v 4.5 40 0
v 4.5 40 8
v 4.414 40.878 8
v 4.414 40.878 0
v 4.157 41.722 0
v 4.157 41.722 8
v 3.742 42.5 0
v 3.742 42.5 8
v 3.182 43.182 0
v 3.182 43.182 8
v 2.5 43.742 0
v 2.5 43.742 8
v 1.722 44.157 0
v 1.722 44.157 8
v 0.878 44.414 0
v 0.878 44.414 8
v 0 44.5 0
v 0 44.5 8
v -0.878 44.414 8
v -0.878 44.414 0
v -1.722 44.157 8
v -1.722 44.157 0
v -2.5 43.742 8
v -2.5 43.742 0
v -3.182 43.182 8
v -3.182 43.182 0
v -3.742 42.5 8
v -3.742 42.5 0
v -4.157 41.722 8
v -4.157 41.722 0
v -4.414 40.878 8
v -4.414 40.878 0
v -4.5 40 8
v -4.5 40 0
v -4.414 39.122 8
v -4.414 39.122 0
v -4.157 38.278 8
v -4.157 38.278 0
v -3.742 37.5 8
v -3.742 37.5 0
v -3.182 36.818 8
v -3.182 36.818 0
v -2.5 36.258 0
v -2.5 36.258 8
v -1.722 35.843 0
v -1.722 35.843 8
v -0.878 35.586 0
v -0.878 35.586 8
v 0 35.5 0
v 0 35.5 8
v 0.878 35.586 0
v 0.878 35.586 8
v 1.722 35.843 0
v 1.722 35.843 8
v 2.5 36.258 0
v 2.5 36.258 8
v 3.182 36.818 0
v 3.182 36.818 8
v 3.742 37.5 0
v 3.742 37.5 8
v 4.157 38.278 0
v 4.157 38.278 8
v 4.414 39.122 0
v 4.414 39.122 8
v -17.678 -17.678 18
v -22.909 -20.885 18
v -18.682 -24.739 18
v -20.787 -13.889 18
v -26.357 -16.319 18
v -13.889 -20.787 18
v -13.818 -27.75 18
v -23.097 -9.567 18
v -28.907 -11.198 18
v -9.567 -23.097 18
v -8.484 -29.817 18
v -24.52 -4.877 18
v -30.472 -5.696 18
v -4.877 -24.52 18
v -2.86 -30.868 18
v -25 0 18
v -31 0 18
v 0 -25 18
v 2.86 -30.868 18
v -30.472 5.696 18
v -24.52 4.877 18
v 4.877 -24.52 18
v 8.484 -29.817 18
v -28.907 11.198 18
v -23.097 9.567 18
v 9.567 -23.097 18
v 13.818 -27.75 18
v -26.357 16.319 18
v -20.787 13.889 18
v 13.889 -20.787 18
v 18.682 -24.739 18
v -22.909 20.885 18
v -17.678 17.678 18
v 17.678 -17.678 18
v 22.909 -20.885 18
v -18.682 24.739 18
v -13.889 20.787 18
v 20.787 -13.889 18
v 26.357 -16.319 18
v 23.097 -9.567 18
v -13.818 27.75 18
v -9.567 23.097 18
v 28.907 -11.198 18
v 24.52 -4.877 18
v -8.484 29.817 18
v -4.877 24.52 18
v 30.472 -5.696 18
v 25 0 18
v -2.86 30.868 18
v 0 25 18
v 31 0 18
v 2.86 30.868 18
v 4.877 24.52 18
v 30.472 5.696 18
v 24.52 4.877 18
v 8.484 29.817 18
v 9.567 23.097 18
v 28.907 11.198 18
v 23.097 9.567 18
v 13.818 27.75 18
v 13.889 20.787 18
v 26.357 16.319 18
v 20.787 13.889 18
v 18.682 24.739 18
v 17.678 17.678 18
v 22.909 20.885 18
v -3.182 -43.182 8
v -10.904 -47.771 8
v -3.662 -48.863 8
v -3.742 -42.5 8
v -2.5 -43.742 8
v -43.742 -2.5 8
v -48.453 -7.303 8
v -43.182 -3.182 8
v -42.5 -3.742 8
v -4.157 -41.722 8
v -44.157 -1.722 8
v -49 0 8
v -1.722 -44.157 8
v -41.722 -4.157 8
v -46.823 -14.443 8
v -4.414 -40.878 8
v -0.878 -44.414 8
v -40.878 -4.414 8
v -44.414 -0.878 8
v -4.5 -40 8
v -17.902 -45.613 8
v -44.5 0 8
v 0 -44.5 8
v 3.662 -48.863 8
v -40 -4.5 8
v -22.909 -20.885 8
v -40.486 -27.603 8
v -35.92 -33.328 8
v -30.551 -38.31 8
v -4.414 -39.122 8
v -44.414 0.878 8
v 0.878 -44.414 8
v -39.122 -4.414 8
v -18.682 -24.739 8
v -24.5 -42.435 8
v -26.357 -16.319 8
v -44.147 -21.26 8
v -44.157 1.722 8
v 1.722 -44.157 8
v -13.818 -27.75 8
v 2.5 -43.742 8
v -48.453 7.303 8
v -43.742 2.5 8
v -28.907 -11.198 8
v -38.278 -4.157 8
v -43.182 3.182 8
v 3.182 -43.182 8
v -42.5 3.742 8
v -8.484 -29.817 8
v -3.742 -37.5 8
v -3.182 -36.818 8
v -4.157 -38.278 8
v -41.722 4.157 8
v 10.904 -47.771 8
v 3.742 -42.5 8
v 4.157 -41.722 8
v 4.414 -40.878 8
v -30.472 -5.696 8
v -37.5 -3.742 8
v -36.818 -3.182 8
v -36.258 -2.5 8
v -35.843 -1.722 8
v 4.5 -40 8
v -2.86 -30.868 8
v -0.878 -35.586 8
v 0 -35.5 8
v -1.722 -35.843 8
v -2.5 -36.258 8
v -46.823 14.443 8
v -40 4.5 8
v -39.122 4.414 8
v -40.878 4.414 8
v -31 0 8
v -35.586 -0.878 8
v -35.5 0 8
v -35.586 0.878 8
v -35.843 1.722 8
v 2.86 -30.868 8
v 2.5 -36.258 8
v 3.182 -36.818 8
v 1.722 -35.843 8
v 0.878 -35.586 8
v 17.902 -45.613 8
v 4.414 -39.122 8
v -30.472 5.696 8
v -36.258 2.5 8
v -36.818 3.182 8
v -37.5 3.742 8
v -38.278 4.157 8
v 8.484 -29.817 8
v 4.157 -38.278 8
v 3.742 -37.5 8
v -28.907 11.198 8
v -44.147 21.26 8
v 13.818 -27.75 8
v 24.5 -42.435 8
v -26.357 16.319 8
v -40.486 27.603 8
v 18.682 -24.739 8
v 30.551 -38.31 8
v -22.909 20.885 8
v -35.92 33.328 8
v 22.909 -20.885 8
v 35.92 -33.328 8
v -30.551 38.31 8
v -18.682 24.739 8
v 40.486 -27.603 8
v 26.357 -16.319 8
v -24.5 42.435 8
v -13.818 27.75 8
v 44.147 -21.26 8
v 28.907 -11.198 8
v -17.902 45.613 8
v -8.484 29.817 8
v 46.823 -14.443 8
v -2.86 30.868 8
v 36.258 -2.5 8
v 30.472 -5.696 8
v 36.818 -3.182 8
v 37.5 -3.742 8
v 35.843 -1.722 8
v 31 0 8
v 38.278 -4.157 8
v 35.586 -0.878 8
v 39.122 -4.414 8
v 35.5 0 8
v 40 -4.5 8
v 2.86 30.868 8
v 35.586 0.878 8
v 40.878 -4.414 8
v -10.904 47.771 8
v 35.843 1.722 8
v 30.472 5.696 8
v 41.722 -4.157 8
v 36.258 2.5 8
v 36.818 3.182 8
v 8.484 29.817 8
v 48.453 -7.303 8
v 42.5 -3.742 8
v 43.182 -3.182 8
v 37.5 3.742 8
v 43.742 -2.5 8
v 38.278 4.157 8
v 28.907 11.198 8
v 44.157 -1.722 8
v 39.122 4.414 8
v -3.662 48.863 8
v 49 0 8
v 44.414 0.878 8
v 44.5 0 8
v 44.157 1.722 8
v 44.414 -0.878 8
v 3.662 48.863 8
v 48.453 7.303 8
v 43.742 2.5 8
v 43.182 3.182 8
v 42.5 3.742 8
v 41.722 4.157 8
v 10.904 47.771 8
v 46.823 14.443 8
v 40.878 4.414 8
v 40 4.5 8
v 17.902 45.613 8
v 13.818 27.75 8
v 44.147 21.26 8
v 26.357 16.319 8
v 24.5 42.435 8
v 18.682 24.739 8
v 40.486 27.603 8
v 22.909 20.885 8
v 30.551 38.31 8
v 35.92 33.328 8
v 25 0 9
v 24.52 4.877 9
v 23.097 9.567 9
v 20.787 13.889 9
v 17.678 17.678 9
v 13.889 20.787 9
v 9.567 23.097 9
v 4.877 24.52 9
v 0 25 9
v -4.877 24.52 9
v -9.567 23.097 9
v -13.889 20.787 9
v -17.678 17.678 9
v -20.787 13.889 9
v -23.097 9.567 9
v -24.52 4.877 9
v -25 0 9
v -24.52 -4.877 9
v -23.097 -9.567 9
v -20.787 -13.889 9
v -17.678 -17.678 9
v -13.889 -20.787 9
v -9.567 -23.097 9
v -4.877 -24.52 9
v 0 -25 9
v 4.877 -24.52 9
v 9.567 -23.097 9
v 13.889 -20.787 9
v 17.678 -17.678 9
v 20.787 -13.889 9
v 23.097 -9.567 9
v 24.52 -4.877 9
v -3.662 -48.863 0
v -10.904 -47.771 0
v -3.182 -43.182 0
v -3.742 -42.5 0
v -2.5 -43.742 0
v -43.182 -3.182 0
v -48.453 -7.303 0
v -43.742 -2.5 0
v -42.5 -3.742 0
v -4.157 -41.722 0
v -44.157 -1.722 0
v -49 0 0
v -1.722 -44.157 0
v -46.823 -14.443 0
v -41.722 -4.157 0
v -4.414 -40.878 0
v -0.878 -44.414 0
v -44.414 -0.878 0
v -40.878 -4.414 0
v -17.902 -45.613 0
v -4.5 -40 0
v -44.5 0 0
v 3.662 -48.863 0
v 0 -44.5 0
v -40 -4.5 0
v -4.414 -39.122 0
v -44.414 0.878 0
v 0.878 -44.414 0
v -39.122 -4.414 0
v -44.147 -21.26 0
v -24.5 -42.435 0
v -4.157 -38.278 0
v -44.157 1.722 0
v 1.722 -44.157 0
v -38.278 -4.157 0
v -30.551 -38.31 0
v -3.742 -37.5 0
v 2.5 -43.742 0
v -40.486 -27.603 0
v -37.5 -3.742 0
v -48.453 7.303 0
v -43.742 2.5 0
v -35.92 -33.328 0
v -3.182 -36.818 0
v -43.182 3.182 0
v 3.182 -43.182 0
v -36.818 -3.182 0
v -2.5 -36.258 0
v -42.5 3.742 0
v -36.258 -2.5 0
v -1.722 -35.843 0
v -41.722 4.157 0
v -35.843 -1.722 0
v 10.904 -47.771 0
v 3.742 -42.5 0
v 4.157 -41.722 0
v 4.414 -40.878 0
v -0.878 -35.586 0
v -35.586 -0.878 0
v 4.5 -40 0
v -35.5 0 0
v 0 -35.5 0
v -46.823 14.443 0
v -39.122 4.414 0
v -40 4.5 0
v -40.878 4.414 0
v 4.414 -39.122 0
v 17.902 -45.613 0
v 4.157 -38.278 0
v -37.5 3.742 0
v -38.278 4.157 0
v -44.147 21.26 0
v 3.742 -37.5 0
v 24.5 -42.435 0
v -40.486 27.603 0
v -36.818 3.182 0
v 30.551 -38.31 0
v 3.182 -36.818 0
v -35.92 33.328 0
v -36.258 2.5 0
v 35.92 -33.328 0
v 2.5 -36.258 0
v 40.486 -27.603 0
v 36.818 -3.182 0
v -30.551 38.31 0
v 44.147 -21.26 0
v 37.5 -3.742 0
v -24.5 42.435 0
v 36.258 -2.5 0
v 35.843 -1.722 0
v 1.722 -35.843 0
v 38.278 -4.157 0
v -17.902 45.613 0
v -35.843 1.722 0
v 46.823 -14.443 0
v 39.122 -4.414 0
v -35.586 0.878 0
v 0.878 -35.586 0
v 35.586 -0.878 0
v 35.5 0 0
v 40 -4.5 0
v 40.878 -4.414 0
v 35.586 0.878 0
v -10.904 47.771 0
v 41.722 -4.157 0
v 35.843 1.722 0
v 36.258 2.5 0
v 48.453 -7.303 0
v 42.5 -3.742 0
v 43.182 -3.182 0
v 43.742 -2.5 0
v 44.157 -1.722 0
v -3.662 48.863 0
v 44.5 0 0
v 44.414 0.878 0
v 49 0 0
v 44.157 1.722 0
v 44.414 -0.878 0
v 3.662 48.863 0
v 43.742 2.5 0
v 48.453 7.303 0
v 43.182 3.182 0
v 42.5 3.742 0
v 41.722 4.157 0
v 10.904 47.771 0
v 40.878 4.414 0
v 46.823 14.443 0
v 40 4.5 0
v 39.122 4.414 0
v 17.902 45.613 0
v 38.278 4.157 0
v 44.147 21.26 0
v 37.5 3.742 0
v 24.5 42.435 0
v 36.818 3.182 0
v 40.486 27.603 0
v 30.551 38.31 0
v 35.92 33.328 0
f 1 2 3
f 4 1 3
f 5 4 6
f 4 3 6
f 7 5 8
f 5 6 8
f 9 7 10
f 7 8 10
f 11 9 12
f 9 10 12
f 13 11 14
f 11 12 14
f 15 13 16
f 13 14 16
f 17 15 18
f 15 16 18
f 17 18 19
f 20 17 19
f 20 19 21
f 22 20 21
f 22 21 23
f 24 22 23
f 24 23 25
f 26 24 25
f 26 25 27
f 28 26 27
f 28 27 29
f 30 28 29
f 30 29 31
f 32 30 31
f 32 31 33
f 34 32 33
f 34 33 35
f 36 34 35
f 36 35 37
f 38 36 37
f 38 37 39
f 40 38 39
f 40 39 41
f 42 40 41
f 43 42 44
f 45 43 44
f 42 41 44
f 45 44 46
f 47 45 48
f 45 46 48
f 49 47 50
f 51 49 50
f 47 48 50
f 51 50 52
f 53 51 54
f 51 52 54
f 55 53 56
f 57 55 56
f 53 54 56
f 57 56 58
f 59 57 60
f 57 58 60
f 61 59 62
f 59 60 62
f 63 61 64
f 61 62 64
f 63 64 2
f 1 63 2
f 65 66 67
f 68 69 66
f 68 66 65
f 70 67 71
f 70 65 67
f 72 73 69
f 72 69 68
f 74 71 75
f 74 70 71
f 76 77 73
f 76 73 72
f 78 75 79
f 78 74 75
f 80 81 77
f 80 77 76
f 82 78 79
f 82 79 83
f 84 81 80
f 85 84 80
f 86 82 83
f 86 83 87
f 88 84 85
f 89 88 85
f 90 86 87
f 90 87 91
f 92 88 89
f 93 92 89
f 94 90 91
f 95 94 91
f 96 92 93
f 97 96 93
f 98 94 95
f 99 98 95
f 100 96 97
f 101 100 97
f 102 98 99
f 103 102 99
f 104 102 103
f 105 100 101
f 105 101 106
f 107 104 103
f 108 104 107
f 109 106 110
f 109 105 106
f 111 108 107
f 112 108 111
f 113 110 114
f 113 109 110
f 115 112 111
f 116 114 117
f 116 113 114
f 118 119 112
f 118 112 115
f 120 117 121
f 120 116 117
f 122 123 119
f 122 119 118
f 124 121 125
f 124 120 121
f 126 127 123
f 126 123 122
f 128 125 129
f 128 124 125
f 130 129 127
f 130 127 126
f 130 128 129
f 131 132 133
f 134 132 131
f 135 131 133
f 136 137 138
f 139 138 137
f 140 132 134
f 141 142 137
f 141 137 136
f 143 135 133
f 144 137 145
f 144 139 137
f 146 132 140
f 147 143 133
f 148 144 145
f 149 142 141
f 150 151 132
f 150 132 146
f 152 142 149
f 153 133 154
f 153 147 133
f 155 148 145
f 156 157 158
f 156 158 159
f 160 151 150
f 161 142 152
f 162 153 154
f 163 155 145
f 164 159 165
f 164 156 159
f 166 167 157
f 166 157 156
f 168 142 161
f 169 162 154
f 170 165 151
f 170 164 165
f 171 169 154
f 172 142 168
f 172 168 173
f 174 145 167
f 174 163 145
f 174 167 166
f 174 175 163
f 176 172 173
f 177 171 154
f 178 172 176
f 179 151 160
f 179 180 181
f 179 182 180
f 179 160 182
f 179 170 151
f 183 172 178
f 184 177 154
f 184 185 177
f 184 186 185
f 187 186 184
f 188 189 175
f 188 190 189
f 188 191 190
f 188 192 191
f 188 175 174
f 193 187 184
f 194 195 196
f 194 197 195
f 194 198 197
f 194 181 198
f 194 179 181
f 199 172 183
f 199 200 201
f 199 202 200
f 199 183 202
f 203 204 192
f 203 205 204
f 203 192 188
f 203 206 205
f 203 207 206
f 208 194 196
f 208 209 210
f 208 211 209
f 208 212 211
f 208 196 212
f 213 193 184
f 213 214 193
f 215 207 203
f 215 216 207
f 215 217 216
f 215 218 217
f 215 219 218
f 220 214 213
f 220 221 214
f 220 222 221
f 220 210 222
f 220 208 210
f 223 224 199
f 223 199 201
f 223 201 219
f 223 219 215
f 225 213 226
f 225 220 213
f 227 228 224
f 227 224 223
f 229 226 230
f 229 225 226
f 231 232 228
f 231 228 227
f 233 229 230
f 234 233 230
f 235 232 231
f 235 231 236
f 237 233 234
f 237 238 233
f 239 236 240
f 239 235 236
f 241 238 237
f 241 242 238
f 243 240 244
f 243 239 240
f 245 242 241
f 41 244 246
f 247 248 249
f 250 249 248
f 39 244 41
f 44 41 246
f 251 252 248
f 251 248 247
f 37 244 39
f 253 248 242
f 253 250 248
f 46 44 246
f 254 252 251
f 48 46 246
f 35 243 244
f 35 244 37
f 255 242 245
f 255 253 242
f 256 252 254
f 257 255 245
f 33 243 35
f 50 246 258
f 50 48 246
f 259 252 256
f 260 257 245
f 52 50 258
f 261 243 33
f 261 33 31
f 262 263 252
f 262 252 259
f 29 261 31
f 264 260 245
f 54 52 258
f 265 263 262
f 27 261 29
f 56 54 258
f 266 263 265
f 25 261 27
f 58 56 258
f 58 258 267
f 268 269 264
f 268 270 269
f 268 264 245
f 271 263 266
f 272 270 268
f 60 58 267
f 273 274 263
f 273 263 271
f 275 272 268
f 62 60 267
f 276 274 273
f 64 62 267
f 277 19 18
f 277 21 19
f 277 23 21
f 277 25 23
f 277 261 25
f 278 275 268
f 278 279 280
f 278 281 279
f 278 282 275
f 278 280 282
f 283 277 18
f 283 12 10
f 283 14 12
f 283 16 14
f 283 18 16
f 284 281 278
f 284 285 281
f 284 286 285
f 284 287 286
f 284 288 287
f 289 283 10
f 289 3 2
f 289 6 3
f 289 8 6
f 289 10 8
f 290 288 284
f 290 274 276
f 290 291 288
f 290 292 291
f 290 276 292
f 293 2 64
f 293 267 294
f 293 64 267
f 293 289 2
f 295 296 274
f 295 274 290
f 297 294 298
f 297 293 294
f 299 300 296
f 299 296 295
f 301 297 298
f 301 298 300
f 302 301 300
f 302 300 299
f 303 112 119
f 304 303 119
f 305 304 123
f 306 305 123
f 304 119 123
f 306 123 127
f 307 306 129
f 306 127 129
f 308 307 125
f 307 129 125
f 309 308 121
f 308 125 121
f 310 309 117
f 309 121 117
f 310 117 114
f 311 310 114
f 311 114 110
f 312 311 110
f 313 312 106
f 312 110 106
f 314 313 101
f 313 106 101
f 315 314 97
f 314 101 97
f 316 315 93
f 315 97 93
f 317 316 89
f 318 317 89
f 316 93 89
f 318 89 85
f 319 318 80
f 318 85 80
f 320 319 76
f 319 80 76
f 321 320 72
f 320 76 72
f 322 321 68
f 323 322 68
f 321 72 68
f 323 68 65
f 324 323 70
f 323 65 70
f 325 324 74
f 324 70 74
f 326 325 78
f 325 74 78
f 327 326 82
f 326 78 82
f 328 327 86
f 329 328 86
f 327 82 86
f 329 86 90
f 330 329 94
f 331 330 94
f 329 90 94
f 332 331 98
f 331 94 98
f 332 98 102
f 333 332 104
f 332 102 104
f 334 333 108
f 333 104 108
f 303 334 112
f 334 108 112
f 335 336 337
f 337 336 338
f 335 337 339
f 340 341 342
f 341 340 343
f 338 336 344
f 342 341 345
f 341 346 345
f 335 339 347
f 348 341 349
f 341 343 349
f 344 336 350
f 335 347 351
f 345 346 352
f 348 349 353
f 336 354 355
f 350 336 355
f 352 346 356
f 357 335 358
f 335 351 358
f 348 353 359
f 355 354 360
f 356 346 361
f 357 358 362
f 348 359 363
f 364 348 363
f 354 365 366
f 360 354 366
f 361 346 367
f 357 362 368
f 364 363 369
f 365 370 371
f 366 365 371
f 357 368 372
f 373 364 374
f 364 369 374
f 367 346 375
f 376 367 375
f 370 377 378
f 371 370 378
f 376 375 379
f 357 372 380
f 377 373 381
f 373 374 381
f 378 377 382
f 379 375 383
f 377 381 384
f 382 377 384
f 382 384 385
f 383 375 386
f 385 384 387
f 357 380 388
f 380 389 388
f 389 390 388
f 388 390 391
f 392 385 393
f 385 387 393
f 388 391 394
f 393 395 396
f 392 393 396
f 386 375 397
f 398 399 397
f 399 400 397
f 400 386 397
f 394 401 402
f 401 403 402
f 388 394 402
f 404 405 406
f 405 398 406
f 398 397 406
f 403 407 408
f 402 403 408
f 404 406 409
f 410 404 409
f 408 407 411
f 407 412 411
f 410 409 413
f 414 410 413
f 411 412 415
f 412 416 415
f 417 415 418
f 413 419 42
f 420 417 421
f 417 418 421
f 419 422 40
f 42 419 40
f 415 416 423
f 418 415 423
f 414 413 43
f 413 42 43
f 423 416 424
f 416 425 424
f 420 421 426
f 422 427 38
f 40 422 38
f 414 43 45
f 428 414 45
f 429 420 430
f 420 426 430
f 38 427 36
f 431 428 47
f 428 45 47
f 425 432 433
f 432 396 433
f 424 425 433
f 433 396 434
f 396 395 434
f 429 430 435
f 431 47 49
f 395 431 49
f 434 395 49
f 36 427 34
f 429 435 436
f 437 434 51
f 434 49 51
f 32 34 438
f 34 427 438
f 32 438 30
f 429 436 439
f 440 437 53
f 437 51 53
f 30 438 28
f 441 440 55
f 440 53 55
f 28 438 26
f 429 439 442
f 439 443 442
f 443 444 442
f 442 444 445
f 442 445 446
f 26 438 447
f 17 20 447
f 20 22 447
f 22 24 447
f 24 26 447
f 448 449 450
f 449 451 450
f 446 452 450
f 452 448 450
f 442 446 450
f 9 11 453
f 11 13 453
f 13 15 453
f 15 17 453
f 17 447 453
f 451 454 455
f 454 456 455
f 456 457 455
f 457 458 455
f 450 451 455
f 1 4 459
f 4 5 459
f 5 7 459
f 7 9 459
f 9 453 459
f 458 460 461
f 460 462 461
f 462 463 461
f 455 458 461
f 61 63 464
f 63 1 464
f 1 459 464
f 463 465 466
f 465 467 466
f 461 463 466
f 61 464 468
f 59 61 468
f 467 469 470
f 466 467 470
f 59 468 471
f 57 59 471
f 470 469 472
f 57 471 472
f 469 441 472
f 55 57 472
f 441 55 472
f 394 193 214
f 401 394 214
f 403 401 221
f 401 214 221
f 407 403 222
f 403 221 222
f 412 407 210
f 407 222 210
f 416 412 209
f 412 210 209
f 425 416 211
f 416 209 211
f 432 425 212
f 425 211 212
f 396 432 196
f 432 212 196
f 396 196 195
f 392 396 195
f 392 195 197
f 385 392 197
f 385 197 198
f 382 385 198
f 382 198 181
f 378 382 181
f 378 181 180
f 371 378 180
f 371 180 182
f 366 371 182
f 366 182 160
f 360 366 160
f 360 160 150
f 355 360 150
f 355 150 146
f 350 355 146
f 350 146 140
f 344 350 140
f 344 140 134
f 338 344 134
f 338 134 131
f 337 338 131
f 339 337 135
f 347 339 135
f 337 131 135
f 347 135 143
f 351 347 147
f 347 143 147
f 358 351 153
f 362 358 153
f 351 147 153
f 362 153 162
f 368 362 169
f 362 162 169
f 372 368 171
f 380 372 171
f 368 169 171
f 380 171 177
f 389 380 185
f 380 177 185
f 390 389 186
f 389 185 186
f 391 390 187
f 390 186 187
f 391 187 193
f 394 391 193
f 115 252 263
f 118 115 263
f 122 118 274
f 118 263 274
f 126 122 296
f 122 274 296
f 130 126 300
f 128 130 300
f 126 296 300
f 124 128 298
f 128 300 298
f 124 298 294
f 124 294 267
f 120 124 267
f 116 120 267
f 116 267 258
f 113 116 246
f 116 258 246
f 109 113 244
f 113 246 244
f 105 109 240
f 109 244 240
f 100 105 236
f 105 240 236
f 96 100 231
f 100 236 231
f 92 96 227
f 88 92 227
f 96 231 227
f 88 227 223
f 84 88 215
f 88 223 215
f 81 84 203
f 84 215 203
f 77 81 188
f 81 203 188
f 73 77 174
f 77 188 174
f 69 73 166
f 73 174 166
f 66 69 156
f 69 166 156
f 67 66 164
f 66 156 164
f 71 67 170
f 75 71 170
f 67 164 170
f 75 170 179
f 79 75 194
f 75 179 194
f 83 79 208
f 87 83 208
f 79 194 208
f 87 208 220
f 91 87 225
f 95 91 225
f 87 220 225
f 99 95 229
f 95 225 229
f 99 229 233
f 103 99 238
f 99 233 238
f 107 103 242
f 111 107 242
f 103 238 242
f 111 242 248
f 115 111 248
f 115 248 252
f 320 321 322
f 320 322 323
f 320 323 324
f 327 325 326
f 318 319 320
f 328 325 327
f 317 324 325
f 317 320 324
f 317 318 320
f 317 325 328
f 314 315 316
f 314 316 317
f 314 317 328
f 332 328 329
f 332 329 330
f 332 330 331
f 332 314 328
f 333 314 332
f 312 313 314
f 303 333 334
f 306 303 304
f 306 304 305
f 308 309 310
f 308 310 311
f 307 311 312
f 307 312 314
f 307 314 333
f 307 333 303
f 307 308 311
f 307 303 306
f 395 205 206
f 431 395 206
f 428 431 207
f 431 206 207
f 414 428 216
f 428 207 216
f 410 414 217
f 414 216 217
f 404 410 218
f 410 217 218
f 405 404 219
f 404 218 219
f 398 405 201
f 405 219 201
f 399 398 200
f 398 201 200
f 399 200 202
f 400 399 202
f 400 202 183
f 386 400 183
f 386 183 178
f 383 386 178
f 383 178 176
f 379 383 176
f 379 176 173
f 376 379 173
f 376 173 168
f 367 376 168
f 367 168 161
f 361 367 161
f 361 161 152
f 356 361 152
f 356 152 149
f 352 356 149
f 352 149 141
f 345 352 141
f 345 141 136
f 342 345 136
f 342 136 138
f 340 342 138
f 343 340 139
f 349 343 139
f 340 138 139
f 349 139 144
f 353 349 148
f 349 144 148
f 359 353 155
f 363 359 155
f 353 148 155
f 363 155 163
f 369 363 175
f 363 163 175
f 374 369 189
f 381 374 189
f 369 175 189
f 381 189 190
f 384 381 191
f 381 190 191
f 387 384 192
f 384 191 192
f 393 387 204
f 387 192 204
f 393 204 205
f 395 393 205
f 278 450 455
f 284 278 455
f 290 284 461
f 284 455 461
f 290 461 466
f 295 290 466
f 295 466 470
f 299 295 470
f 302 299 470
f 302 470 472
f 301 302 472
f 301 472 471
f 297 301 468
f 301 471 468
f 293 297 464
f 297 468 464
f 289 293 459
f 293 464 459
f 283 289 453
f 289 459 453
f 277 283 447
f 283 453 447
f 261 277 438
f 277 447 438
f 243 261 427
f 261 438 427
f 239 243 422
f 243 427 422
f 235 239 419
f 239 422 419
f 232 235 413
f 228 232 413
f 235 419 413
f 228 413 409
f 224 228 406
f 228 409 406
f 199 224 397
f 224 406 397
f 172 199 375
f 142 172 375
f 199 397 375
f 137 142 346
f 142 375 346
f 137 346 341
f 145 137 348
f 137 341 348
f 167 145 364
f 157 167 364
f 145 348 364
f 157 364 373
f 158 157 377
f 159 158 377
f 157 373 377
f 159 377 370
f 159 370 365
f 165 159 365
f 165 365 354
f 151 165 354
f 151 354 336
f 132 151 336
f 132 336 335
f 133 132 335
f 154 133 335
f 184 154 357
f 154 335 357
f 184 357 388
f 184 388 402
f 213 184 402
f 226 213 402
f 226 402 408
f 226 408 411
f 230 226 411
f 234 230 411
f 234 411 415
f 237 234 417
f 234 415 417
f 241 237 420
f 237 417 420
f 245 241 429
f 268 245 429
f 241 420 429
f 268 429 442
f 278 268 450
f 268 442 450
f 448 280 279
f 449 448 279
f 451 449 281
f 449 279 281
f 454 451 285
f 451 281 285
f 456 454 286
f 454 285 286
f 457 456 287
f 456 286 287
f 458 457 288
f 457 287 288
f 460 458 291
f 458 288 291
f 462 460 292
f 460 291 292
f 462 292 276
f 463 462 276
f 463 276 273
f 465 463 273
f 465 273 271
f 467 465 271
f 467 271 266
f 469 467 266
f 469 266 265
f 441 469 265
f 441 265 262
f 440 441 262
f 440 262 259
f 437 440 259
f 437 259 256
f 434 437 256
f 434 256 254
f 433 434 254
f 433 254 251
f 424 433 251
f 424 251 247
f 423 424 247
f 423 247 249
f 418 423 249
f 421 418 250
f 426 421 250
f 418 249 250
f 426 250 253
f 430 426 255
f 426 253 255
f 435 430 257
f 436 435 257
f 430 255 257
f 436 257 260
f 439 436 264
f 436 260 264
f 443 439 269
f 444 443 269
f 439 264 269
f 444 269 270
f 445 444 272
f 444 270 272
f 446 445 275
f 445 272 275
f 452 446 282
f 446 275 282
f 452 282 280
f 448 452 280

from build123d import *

# Parameters (mm, degrees)
SKETCH_1_R          = 49
EXTRUDE_1_DEPTH     = 8
SKETCH_2_R          = 31
EXTRUDE_2_DEPTH     = 10
SKETCH_3_R          = 25
CUT_EXTRUDE_1_DEPTH = 9
SKETCH_4_R          = 4.5
CUT_EXTRUDE_2_DEPTH = 49


with BuildPart() as part:
    # 草图1 → 凸台-拉伸1 (new body)
    with BuildSketch(Plane.XY):
        Circle(SKETCH_1_R)
    extrude(amount=EXTRUDE_1_DEPTH)

    # 草图2 → 凸台-拉伸2 (add)
    with BuildSketch(Plane.XY.offset(8)):
        Circle(SKETCH_2_R)
    extrude(amount=EXTRUDE_2_DEPTH)

    # 草图3 → 切除-拉伸1 (cut)
    with BuildSketch(Plane.XY.offset(18)):
        Circle(SKETCH_3_R)
    extrude(amount=-CUT_EXTRUDE_1_DEPTH, mode=Mode.SUBTRACT)

    # 草图4 → 切除-拉伸2 (cut)
    with BuildSketch(Plane.XY.offset(8)):
        with Locations((0, 40)):
            Circle(SKETCH_4_R)
        with Locations((40, 0)):
            Circle(SKETCH_4_R)
        with Locations((0, -40)):
            Circle(SKETCH_4_R)
        with Locations((-40, 0)):
            Circle(SKETCH_4_R)
    extrude(amount=-CUT_EXTRUDE_2_DEPTH, mode=Mode.SUBTRACT)


solid = part.part
